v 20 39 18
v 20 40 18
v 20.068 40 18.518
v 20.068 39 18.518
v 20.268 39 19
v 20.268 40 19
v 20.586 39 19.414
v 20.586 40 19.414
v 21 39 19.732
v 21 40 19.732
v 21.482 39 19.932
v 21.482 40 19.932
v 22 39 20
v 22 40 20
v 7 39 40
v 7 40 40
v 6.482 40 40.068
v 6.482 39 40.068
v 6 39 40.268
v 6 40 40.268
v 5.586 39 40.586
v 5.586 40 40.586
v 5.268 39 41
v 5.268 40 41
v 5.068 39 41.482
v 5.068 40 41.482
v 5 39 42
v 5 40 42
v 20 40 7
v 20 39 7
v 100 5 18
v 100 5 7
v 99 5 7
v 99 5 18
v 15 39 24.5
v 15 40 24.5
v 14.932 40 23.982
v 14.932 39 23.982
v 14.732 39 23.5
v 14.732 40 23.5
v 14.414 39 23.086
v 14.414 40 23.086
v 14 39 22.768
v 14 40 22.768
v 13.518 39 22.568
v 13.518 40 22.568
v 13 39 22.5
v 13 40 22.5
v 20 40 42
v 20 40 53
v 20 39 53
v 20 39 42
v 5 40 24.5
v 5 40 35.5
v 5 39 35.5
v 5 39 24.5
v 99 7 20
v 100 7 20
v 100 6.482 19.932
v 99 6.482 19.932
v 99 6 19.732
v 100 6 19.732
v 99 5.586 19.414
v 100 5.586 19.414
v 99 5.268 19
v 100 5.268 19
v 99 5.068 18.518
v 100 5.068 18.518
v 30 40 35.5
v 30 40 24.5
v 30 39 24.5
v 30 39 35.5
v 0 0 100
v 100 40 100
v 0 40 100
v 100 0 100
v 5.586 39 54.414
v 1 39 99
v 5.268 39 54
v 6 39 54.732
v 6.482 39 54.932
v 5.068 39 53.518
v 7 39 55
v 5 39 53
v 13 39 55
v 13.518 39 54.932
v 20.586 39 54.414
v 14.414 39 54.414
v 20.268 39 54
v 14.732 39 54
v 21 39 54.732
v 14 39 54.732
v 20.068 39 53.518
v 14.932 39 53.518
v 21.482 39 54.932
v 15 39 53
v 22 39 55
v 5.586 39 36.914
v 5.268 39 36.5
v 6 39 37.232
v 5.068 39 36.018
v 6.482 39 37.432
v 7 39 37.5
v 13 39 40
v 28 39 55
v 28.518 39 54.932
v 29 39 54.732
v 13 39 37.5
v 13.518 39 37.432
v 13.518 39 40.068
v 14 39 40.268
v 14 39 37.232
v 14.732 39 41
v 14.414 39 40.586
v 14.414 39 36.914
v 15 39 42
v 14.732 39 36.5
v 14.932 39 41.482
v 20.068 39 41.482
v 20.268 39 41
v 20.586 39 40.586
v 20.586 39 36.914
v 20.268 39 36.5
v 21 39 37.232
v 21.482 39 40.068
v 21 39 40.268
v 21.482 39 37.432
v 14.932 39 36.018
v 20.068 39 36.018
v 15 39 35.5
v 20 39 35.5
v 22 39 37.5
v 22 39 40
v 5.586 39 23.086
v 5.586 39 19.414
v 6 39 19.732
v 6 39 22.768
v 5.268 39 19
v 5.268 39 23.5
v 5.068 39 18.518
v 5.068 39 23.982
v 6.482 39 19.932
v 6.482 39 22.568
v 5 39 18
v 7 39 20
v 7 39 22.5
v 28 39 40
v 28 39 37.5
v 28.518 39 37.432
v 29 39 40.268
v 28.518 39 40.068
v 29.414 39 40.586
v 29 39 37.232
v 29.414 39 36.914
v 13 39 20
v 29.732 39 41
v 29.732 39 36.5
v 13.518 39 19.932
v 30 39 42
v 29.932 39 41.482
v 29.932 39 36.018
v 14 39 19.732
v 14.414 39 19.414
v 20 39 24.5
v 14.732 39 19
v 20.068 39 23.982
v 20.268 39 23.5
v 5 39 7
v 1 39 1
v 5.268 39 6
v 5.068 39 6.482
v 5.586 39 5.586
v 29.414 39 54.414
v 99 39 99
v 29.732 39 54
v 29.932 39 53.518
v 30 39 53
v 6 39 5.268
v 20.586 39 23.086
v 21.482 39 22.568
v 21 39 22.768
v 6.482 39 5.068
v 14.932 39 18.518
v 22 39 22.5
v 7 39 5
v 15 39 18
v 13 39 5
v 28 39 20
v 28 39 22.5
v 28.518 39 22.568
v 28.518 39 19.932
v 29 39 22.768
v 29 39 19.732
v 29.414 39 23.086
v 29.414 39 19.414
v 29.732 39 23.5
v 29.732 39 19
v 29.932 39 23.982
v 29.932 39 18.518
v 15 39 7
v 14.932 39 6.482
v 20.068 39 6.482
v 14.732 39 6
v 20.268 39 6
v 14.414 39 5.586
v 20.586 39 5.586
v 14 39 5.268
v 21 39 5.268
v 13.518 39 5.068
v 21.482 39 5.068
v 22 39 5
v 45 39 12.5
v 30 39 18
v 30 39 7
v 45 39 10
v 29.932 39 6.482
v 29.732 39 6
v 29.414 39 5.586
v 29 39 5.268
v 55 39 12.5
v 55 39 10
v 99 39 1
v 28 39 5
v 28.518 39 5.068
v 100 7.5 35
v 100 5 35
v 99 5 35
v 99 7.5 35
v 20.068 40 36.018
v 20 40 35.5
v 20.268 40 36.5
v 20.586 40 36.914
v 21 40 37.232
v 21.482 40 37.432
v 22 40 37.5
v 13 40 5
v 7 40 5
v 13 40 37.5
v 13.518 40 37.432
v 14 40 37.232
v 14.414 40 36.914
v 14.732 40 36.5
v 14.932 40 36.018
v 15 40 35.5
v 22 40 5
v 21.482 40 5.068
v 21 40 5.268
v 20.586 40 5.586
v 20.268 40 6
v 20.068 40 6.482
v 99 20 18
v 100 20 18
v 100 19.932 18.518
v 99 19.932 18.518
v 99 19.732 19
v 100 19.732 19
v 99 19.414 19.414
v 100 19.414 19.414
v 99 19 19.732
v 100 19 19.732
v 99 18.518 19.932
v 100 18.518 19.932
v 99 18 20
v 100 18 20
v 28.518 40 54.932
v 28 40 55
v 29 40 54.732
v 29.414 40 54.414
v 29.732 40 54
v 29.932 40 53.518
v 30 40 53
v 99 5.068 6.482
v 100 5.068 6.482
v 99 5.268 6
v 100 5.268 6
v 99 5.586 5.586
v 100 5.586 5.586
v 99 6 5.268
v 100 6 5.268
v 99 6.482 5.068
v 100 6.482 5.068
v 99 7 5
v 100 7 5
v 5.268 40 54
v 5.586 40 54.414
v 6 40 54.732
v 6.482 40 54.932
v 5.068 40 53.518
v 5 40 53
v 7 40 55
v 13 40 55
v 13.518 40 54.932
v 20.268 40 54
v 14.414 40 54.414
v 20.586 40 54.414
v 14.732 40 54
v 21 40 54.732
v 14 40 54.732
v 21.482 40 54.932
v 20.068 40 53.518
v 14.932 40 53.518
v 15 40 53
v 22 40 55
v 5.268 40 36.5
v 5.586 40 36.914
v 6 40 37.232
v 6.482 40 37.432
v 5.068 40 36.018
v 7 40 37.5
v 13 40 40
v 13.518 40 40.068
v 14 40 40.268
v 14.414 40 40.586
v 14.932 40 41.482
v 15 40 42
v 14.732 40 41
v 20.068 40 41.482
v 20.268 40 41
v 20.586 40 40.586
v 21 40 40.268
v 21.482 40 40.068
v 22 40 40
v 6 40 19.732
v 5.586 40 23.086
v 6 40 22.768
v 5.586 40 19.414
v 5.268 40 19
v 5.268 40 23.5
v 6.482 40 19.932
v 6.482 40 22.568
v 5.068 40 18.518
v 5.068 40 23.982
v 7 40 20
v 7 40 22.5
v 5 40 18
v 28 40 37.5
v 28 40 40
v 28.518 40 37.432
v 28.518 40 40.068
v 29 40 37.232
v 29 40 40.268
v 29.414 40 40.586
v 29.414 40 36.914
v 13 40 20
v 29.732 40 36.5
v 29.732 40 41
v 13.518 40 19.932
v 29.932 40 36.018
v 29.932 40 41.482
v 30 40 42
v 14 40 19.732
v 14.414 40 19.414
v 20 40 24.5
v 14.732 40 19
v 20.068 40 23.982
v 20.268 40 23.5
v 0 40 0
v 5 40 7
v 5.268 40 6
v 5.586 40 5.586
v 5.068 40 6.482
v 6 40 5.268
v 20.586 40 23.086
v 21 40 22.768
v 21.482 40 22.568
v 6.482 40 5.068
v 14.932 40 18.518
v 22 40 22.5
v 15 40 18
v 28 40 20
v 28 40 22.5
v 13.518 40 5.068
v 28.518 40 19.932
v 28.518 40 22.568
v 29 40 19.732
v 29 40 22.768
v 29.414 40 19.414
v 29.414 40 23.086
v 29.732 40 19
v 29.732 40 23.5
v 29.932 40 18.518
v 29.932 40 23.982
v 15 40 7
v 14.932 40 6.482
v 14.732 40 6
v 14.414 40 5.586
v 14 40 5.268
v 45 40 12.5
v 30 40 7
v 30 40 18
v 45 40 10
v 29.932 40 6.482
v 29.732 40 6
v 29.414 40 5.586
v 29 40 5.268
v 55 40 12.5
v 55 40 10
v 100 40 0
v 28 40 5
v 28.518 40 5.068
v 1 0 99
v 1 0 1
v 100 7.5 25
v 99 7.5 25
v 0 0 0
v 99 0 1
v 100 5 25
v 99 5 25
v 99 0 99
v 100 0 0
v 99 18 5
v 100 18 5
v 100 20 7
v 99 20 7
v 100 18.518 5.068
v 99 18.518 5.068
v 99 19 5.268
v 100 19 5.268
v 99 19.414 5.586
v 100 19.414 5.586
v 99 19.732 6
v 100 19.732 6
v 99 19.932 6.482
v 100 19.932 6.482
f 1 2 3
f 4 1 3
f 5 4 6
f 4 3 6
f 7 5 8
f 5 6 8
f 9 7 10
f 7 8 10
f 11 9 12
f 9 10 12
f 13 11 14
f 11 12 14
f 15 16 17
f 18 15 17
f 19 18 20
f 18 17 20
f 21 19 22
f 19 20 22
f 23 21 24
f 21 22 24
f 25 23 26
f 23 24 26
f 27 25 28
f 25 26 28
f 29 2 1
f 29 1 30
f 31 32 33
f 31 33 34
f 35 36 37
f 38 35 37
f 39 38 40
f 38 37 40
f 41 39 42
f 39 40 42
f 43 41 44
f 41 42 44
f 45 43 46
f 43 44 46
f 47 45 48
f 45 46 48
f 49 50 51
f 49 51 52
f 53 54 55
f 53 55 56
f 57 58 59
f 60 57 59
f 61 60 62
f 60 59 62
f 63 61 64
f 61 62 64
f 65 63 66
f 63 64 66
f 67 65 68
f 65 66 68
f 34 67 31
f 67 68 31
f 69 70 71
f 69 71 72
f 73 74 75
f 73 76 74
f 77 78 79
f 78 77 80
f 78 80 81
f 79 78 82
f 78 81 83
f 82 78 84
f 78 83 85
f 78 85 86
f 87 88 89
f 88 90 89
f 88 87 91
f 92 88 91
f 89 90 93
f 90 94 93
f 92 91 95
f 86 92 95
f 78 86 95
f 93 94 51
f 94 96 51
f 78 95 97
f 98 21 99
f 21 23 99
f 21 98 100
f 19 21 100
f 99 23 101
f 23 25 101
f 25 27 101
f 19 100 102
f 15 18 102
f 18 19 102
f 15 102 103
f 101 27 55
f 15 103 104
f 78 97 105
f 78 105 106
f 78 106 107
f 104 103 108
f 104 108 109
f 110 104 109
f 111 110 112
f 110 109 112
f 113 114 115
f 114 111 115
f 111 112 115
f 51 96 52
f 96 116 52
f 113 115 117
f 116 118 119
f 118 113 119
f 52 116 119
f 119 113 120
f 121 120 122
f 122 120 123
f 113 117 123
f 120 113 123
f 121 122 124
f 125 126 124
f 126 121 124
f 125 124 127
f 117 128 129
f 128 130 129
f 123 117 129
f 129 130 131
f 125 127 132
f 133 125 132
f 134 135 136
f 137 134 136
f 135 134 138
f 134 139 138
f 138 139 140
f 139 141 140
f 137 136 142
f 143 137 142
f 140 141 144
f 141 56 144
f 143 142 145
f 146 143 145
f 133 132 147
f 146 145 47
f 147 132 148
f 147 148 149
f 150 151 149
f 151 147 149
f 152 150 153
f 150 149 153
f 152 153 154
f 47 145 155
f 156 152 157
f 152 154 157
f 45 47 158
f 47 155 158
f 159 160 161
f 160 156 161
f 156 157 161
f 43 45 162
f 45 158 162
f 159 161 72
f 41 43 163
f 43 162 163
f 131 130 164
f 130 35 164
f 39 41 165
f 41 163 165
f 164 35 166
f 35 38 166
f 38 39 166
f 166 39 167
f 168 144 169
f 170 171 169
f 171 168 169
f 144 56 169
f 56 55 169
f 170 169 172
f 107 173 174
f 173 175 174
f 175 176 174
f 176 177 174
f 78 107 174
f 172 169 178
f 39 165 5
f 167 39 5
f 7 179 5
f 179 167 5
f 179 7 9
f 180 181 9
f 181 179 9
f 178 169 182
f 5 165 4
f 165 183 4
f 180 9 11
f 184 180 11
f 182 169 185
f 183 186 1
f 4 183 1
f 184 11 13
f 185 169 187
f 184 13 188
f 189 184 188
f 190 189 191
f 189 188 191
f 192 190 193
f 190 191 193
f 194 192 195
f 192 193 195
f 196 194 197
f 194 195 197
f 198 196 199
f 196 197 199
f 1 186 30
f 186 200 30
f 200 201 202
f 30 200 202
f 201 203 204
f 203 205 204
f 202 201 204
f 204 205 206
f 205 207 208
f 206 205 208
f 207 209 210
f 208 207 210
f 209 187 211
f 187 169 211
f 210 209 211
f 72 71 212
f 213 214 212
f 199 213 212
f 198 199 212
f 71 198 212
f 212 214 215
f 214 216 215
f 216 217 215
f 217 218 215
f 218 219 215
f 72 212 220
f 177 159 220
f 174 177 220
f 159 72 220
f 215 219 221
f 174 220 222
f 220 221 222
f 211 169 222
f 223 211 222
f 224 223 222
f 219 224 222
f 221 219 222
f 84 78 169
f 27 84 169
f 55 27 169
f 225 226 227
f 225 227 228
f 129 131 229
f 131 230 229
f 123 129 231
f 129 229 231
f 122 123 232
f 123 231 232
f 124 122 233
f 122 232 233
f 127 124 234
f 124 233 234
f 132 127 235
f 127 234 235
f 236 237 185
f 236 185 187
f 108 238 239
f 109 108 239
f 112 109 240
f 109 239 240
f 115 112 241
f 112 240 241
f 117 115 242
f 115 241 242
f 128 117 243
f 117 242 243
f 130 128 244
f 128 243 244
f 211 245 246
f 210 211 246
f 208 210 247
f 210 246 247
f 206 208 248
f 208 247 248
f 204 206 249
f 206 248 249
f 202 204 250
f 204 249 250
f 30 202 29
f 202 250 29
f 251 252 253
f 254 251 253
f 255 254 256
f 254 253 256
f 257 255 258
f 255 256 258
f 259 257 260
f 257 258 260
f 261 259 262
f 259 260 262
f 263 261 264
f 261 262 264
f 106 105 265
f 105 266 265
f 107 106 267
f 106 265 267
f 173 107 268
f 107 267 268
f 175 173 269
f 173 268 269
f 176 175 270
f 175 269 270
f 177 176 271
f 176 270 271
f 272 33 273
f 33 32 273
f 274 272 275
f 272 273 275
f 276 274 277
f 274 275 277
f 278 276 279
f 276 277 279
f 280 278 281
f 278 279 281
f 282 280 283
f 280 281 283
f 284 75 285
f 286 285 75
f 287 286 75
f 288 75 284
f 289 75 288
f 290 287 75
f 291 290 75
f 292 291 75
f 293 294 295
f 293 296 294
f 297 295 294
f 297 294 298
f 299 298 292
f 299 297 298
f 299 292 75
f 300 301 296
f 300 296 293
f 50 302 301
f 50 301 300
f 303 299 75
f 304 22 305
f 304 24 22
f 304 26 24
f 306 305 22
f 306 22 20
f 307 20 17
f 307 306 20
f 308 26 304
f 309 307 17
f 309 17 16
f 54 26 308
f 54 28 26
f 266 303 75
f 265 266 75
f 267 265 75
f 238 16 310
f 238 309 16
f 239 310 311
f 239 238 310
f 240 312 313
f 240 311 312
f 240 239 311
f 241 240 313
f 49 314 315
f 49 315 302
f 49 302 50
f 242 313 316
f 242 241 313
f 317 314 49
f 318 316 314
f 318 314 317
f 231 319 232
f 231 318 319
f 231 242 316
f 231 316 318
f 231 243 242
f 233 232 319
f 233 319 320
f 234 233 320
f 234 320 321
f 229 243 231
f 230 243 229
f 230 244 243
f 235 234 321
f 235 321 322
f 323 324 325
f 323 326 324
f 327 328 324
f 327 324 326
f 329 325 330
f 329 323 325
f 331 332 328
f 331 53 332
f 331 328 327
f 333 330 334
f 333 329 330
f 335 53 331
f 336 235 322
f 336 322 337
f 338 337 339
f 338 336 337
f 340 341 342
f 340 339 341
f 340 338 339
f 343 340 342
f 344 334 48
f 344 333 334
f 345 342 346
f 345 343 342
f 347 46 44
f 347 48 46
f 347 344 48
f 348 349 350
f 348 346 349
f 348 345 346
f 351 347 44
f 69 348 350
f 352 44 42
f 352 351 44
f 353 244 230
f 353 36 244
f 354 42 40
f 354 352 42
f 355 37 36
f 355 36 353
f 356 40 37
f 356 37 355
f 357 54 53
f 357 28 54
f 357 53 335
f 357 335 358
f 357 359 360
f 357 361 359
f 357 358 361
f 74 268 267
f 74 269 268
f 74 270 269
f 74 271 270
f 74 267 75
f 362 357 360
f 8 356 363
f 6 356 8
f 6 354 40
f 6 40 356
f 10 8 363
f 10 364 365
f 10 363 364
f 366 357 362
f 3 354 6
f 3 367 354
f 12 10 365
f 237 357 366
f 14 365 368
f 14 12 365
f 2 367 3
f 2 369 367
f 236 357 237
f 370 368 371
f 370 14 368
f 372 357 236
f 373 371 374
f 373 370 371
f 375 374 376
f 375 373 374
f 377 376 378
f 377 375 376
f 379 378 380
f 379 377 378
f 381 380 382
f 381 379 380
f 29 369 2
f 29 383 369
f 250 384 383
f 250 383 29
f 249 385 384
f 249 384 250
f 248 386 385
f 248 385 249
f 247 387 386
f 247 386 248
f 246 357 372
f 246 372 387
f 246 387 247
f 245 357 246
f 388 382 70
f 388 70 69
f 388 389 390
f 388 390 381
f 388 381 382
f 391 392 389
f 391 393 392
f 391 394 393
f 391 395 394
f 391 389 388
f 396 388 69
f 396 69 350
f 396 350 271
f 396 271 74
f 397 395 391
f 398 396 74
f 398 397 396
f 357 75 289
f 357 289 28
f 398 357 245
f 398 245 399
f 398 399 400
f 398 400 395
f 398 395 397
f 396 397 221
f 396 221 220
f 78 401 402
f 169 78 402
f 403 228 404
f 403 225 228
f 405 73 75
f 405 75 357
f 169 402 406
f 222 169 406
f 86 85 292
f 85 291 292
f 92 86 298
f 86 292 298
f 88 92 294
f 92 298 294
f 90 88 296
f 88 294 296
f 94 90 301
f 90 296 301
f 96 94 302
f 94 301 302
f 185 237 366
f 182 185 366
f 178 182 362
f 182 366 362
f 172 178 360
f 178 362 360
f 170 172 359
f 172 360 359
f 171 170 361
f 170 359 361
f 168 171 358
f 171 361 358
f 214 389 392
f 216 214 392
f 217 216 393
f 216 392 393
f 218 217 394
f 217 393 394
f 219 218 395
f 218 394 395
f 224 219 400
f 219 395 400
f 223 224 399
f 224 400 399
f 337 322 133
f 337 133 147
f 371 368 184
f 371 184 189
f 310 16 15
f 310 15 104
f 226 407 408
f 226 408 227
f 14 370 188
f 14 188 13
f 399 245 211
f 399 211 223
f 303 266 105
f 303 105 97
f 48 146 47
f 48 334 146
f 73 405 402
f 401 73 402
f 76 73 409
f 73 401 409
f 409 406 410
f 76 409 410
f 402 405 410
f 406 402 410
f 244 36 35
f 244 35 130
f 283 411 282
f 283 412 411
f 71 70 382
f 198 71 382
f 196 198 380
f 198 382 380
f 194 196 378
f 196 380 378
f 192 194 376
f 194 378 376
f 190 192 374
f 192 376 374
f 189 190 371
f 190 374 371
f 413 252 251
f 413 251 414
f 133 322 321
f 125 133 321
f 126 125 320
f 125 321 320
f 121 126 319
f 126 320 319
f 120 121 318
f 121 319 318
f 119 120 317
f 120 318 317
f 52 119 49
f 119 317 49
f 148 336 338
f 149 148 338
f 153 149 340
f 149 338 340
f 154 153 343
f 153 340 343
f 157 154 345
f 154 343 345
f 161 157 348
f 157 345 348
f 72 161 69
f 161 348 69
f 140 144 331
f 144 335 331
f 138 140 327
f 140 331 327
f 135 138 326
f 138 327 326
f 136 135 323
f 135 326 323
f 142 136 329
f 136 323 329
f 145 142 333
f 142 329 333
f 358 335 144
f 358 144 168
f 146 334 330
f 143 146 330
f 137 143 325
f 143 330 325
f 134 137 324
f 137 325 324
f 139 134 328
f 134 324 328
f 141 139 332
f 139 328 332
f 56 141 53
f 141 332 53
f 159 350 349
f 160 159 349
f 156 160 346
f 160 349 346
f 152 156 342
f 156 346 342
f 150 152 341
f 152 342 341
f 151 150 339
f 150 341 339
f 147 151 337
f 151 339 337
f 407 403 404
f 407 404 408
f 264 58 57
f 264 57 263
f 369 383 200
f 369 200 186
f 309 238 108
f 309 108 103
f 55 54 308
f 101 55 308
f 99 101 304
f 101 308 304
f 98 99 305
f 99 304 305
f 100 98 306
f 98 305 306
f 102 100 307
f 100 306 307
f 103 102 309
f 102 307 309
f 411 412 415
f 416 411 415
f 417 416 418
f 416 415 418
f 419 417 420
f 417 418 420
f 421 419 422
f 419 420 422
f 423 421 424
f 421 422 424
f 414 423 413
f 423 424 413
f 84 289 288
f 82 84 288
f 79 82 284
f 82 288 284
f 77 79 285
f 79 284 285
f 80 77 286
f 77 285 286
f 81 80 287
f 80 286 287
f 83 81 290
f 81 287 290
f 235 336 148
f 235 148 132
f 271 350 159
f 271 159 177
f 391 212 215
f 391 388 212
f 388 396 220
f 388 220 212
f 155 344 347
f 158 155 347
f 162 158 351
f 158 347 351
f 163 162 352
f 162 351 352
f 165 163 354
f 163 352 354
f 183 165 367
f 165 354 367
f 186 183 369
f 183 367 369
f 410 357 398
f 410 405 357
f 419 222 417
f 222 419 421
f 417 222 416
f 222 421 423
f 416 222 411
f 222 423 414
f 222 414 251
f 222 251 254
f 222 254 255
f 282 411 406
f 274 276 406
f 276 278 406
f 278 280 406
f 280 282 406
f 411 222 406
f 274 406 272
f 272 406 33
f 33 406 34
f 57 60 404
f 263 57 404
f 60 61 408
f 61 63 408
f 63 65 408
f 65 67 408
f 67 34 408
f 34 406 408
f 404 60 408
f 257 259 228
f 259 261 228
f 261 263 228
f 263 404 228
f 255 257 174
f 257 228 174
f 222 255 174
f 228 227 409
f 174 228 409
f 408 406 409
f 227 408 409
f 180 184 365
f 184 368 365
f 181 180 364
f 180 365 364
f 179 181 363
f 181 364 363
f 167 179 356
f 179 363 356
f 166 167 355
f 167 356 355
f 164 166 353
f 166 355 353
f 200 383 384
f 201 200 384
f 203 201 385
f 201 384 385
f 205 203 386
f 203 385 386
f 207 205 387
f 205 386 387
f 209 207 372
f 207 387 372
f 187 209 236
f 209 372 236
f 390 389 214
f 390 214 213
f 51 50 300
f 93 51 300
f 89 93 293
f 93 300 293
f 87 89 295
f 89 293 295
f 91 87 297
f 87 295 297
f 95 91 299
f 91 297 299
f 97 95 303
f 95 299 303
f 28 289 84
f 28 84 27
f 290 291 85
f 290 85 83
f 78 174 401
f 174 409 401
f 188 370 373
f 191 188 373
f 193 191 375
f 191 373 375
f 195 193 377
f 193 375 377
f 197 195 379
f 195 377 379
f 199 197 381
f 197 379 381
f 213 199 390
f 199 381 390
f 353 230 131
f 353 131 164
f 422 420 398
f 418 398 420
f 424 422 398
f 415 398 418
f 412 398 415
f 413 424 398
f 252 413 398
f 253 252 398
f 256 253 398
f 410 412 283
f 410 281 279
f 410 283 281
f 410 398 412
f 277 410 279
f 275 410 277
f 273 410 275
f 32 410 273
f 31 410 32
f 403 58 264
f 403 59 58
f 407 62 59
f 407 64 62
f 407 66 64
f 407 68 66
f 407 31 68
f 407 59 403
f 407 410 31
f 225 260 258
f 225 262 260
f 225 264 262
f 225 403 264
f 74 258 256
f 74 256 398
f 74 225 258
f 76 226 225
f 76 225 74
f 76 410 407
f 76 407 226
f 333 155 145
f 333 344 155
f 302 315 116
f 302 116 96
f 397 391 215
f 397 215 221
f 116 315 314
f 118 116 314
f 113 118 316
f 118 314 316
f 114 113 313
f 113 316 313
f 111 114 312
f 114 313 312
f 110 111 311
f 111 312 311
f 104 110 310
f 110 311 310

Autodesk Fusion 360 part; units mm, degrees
sketch "Sketch1" plane through (0, 0, 0) normal (0, 1, 0) x (1, 0, 0) in component "Outer Hull"
  line L0 (0, 0) -> (100, 0)
  line L1 (100, 0) -> (100, -100)
  line L2 (100, -100) -> (0, -100)
  line L3 (0, -100) -> (0, 0)
  dimension "d1" = 100
  dimension "d2" = 100
extrude "Extrude1" add sketch "Sketch1" along normal blind 40 in component "Outer Hull"
shell "Shell1" thickness 1 removed faces 1 at (33.3333, 0, 33.3333) in component "Outer Hull"
sketch "Button hole" plane through (0, 40, 0) normal (0, 1, 0) x (-1, 0, 0)
  line L0 (0, 100) -> (-100, 100)
  line L1 (-100, 100) -> (-100, 0)
  line L2 (-100, 0) -> (0, 0)
  line L3 (0, 0) -> (0, 100)
  line L4 (-7, 5) -> (-13, 5)
  line L5 (-15, 7) -> (-15, 18)
  line L6 (-13, 20) -> (-7, 20)
  line L7 (-5, 18) -> (-5, 7)
  arc A0 (-7, 5) -> (-5, 7) centre (-7, 7) ccw
  arc A1 (-15, 7) -> (-13, 5) centre (-13, 7) ccw
  arc A2 (-13, 20) -> (-15, 18) centre (-13, 18) ccw
  arc A3 (-5, 18) -> (-7, 20) centre (-7, 18) ccw
  dimension "d6" = 2
extrude "Extrude2" cut sketch "Button hole" against normal blind 1 contours L4 L5 L6 L7 A0 A1 A2 A3 in component "Outer Hull"
pattern_linear "R-Pattern1" count 3 spacing 17.5 along (0, 0, 1) count 2 spacing 15 along (1, 0, 0) of "Extrude2" in component "Outer Hull"
sketch "Top toggle" plane through (0, 40, 0) normal (0, 1, 0) x (-1, 0, 0)
  line L0 (-20, 18) -> (-20, 7)
  arc A0 (-22, 5) -> (-20, 7) centre (-22, 7) ccw
  line L1 (-22, 5) -> (-28, 5)
  arc A1 (-30, 7) -> (-28, 5) centre (-28, 7) ccw
  line L2 (-30, 7) -> (-30, 18)
  arc A2 (-28, 20) -> (-30, 18) centre (-28, 18) ccw
  line L3 (-28, 20) -> (-22, 20)
  arc A3 (-20, 18) -> (-22, 20) centre (-22, 18) ccw
  line L4 (-5, 18) -> (-5, 7)
  arc A4 (-7, 5) -> (-5, 7) centre (-7, 7) ccw
  line L5 (-7, 5) -> (-13, 5)
  arc A5 (-15, 7) -> (-13, 5) centre (-13, 7) ccw
  line L6 (-15, 7) -> (-15, 18)
  arc A6 (-13, 20) -> (-15, 18) centre (-13, 18) ccw
  line L7 (-13, 20) -> (-7, 20)
  arc A7 (-5, 18) -> (-7, 20) centre (-7, 18) ccw
  line L8 (0, 100) -> (-100, 100)
  line L9 (-100, 100) -> (-100, 0)
  line L10 (-100, 0) -> (0, 0)
  line L11 (0, 0) -> (0, 100)
  line L12 (-45, 10) -> (-55, 10)
  line L13 (-55, 10) -> (-55, 12.5)
  line L14 (-55, 12.5) -> (-45, 12.5)
  line L15 (-45, 12.5) -> (-45, 10)
  line L16 (-20, 53) -> (-20, 42)
  arc A8 (-22, 40) -> (-20, 42) centre (-22, 42) ccw
  line L17 (-22, 40) -> (-28, 40)
  arc A9 (-30, 42) -> (-28, 40) centre (-28, 42) ccw
  line L18 (-30, 42) -> (-30, 53)
  arc A10 (-28, 55) -> (-30, 53) centre (-28, 53) ccw
  line L19 (-28, 55) -> (-22, 55)
  arc A11 (-20, 53) -> (-22, 55) centre (-22, 53) ccw
  line L20 (-20, 35.5) -> (-20, 24.5)
  arc A12 (-22, 22.5) -> (-20, 24.5) centre (-22, 24.5) ccw
  line L21 (-22, 22.5) -> (-28, 22.5)
  arc A13 (-30, 24.5) -> (-28, 22.5) centre (-28, 24.5) ccw
  line L22 (-30, 24.5) -> (-30, 35.5)
  arc A14 (-28, 37.5) -> (-30, 35.5) centre (-28, 35.5) ccw
  line L23 (-28, 37.5) -> (-22, 37.5)
  arc A15 (-20, 35.5) -> (-22, 37.5) centre (-22, 35.5) ccw
  line L24 (-5, 53) -> (-5, 42)
  arc A16 (-7, 40) -> (-5, 42) centre (-7, 42) ccw
  line L25 (-7, 40) -> (-13, 40)
  arc A17 (-15, 42) -> (-13, 40) centre (-13, 42) ccw
  line L26 (-15, 42) -> (-15, 53)
  arc A18 (-13, 55) -> (-15, 53) centre (-13, 53) ccw
  line L27 (-13, 55) -> (-7, 55)
  arc A19 (-5, 53) -> (-7, 55) centre (-7, 53) ccw
  line L28 (-5, 35.5) -> (-5, 24.5)
  arc A20 (-7, 22.5) -> (-5, 24.5) centre (-7, 24.5) ccw
  line L29 (-7, 22.5) -> (-13, 22.5)
  arc A21 (-15, 24.5) -> (-13, 22.5) centre (-13, 24.5) ccw
  line L30 (-15, 24.5) -> (-15, 35.5)
  arc A22 (-13, 37.5) -> (-15, 35.5) centre (-13, 35.5) ccw
  line L31 (-13, 37.5) -> (-7, 37.5)
  arc A23 (-5, 35.5) -> (-7, 37.5) centre (-7, 35.5) ccw
  dimension "d17" = 10
  dimension "d18" = 2.5
extrude "Extrude3" cut sketch "Top toggle" against normal blind 1 contours L12 L13 L14 L15 in component "Outer Hull"
sketch "Wire inlet" plane through (100, 0, 0) normal (1, 0, 0) x (0, 0, -1)
  line L0 (-100, 0) -> (0, 0)
  line L1 (0, 0) -> (0, 40)
  line L2 (0, 40) -> (-100, 40)
  line L3 (-100, 40) -> (-100, 0)
  line L4 (-7, 5) -> (-18, 5)
  line L5 (-20, 7) -> (-20, 18)
  line L6 (-18, 20) -> (-7, 20)
  line L7 (-5, 18) -> (-5, 7)
  arc A0 (-18, 20) -> (-20, 18) centre (-18, 18) ccw
  arc A1 (-5, 18) -> (-7, 20) centre (-7, 18) ccw
  arc A2 (-7, 5) -> (-5, 7) centre (-7, 7) ccw
  arc A3 (-20, 7) -> (-18, 5) centre (-18, 7) ccw
  dimension "d21" = 2
extrude "Extrude4" cut sketch "Wire inlet" against normal blind 1 contours L4 L5 L6 L7 A0 A1 A2 A3 in component "Outer Hull"
sketch "Sketch4" plane through (100, 0, 0) normal (1, 0, 0) x (0, 0, -1)
  line L0 (-20, 7) -> (-20, 18)
  arc A0 (-18, 20) -> (-20, 18) centre (-18, 18) ccw
  line L1 (-18, 20) -> (-7, 20)
  arc A1 (-5, 18) -> (-7, 20) centre (-7, 18) ccw
  line L2 (-5, 18) -> (-5, 7)
  arc A2 (-7, 5) -> (-5, 7) centre (-7, 7) ccw
  line L3 (-7, 5) -> (-18, 5)
  arc A3 (-20, 7) -> (-18, 5) centre (-18, 7) ccw
  line L4 (-100, 0) -> (0, 0)
  line L5 (0, 0) -> (0, 40)
  line L6 (0, 40) -> (-100, 40)
  line L7 (-100, 40) -> (-100, 0)
  line L8 (-25, 5) -> (-35, 5)
  line L9 (-35, 5) -> (-35, 7.5)
  line L10 (-35, 7.5) -> (-25, 7.5)
  line L11 (-25, 7.5) -> (-25, 5)
  dimension "d24" = 10
  dimension "d25" = 2.5
extrude "Extrude5" cut sketch "Sketch4" against normal blind 1 contours L8 L9 L10 L11 in component "Outer Hull"
component "Outer Hull" placed x (1, 0, 0) y (0, 1, 0) z (0, 0, 1) at (0, 0, 0)
